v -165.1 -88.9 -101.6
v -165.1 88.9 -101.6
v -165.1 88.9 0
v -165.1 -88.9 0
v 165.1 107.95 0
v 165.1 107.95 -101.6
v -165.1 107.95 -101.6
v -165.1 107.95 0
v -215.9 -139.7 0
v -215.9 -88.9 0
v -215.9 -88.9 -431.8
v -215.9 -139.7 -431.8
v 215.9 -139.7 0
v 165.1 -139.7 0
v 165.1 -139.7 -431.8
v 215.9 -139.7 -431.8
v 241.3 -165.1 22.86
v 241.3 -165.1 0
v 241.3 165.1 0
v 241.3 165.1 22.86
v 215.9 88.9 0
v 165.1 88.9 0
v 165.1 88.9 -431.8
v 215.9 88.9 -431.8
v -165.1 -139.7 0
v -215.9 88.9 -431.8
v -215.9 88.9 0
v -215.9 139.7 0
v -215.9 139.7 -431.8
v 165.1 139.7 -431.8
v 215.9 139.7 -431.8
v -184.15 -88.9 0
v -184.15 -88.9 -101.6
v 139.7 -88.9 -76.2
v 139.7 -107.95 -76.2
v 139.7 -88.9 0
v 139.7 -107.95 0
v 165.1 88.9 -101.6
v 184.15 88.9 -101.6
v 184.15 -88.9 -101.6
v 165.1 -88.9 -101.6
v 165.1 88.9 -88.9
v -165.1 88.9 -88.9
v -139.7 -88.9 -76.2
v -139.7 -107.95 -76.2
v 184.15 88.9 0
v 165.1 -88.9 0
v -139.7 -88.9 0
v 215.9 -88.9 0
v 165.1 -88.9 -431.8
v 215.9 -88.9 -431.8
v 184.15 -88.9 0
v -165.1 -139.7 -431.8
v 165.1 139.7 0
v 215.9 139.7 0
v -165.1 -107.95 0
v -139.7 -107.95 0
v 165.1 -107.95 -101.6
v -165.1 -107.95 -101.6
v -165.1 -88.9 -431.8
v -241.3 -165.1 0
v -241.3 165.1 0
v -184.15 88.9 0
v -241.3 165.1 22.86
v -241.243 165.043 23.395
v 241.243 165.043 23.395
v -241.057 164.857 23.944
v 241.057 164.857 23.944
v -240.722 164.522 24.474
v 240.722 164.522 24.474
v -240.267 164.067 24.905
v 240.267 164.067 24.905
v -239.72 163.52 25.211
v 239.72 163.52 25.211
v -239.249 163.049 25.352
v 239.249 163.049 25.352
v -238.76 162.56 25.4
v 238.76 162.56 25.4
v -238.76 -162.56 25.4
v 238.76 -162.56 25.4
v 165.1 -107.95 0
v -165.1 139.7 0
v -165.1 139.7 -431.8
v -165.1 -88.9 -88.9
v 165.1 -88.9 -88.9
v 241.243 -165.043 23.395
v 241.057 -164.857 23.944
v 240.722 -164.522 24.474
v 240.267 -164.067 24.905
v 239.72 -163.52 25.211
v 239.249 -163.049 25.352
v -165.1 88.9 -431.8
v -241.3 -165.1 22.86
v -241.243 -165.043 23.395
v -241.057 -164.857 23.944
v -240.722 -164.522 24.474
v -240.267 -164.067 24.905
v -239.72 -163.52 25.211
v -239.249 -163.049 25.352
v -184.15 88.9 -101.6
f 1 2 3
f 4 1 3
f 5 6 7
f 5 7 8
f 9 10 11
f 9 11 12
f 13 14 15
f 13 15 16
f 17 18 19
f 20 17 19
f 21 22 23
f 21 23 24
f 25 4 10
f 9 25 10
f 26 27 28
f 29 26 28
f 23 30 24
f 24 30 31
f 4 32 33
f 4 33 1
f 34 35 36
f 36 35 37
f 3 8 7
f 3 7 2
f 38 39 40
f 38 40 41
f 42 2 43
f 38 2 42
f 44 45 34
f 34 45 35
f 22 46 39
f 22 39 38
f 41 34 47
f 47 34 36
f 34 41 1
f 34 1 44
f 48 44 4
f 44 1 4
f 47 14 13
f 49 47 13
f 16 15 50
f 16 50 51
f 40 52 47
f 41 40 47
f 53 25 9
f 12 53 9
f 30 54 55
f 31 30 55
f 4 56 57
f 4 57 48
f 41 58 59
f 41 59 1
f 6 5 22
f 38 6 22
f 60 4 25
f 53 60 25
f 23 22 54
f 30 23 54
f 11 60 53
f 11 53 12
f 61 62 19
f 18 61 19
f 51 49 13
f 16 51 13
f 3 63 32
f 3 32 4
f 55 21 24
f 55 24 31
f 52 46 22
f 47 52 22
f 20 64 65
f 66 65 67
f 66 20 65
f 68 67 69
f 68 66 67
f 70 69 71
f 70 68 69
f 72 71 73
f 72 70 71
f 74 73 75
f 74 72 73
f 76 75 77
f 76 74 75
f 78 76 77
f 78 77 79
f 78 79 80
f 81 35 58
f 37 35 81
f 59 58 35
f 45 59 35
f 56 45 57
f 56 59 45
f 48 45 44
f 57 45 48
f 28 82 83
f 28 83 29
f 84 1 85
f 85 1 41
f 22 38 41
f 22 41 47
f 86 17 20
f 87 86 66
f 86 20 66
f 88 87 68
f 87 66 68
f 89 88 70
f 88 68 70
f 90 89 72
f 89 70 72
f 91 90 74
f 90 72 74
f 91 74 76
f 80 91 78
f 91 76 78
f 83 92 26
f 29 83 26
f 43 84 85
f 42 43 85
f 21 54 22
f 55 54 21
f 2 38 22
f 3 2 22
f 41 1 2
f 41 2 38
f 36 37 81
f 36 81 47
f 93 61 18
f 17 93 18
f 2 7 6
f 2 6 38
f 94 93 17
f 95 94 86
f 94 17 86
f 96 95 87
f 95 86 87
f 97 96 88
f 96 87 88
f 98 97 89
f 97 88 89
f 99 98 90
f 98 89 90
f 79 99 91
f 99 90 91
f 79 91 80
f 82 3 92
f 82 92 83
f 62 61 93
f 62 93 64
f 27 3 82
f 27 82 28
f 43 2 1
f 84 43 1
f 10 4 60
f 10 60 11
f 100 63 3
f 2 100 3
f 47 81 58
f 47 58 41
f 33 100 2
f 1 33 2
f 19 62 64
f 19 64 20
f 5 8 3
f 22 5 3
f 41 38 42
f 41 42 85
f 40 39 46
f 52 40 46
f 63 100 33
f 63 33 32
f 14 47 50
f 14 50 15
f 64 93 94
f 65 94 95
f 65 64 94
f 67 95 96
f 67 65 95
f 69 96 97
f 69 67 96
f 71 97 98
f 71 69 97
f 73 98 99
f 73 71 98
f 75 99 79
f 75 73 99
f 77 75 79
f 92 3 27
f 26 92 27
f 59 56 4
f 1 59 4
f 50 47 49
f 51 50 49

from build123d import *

# Parameters (mm, degrees)
F0_W      = 482.6
F0_H      = 330.2
F1_DEPTH  = 25.4
F2_R      = 2.54
F3_W      = 50.8
F3_H      = 50.8
F4_DEPTH  = 431.8
F7_W      = 19.05
F7_H      = 101.6
F8_DEPTH  = 330.2
F9_W      = 19.05
F9_H      = 101.6
F10_DEPTH = 177.8
F12_W     = 19.05
F12_H     = 101.6
F13_DEPTH = 330.2
F14_W     = 330.2
F14_H     = 177.8
F15_DEPTH = 12.7
F16_W     = 279.4
F16_H     = 76.2
F17_DEPTH = 19.05


with BuildPart() as f1:
    # F0 (on Top) → F1 (new body)
    with BuildSketch(Plane.XY):
        Rectangle(F0_W, F0_H)
    extrude(amount=F1_DEPTH)

    # F2
    f2_edges = [f1.edges().sort_by_distance(p)[0] for p in [
        (241.3, 0, 25.4),
        (0, 165.1, 25.4),
        (-241.3, 0, 25.4),
        (0, -165.1, 25.4),
    ]]
    fillet(f2_edges, radius=F2_R)


with BuildPart() as f4:
    # F3 (on face) → F4 (new body)
    with BuildSketch(Plane(origin=(0, 0, 0), x_dir=(1, 0, 0), z_dir=(0, 0, -1))):
        with Locations((190.5, 114.3)):
            Rectangle(F3_W, F3_H)
    extrude(amount=F4_DEPTH)


with BuildPart() as f5_1:
    # F5: instance of F4
    add(f4.part.mirror(Plane.YZ))


with BuildPart() as f6_1:
    # F6: instance of F4
    add(f4.part.mirror(Plane.XZ))


with BuildPart() as f6_2:
    # F6: instance of F5_1
    add(f5_1.part.mirror(Plane.XZ))


with BuildPart() as f8:
    # F7 (on face) → F8 (new body, through all)
    with BuildSketch(Plane(origin=(165.1, 0, 0), x_dir=(0, -1, 0), z_dir=(-1, 0, 0))):
        with Locations((-98.425, -50.8)):
            Rectangle(F7_W, F7_H)
    extrude(amount=F8_DEPTH)


with BuildPart() as f10:
    # F9 (on face) → F10 (new body, through all)
    with BuildSketch(Plane.XZ.offset(-88.9)):
        with Locations((-174.625, -50.8)):
            Rectangle(F9_W, F9_H)
    extrude(amount=F10_DEPTH)


with BuildPart() as f11_1:
    # F11: instance of F10
    add(f10.part.mirror(Plane.YZ))


with BuildPart() as f13:
    # F12 (on face) → F13 (new body, through all)
    with BuildSketch(Plane.YZ.offset(-165.1)):
        with Locations((-98.425, -50.8)):
            Rectangle(F12_W, F12_H)
    extrude(amount=F13_DEPTH)

    # F16 (on face) → F17 (cut, through all)
    with BuildSketch(Plane.XZ.offset(107.95)):
        with Locations((0, -38.1)):
            Rectangle(F16_W, F16_H)
    extrude(amount=-F17_DEPTH, mode=Mode.SUBTRACT)


with BuildPart() as f15:
    # F14 (on face) → F15 (new body)
    with BuildSketch(Plane(origin=(0, 0, -101.6), x_dir=(1, 0, 0), z_dir=(0, 0, -1))):
        Rectangle(F14_W, F14_H)
    extrude(amount=-F15_DEPTH)


solid = Compound([f1.part, f4.part, f5_1.part, f6_1.part, f6_2.part, f8.part, f10.part, f11_1.part, f13.part, f15.part])
